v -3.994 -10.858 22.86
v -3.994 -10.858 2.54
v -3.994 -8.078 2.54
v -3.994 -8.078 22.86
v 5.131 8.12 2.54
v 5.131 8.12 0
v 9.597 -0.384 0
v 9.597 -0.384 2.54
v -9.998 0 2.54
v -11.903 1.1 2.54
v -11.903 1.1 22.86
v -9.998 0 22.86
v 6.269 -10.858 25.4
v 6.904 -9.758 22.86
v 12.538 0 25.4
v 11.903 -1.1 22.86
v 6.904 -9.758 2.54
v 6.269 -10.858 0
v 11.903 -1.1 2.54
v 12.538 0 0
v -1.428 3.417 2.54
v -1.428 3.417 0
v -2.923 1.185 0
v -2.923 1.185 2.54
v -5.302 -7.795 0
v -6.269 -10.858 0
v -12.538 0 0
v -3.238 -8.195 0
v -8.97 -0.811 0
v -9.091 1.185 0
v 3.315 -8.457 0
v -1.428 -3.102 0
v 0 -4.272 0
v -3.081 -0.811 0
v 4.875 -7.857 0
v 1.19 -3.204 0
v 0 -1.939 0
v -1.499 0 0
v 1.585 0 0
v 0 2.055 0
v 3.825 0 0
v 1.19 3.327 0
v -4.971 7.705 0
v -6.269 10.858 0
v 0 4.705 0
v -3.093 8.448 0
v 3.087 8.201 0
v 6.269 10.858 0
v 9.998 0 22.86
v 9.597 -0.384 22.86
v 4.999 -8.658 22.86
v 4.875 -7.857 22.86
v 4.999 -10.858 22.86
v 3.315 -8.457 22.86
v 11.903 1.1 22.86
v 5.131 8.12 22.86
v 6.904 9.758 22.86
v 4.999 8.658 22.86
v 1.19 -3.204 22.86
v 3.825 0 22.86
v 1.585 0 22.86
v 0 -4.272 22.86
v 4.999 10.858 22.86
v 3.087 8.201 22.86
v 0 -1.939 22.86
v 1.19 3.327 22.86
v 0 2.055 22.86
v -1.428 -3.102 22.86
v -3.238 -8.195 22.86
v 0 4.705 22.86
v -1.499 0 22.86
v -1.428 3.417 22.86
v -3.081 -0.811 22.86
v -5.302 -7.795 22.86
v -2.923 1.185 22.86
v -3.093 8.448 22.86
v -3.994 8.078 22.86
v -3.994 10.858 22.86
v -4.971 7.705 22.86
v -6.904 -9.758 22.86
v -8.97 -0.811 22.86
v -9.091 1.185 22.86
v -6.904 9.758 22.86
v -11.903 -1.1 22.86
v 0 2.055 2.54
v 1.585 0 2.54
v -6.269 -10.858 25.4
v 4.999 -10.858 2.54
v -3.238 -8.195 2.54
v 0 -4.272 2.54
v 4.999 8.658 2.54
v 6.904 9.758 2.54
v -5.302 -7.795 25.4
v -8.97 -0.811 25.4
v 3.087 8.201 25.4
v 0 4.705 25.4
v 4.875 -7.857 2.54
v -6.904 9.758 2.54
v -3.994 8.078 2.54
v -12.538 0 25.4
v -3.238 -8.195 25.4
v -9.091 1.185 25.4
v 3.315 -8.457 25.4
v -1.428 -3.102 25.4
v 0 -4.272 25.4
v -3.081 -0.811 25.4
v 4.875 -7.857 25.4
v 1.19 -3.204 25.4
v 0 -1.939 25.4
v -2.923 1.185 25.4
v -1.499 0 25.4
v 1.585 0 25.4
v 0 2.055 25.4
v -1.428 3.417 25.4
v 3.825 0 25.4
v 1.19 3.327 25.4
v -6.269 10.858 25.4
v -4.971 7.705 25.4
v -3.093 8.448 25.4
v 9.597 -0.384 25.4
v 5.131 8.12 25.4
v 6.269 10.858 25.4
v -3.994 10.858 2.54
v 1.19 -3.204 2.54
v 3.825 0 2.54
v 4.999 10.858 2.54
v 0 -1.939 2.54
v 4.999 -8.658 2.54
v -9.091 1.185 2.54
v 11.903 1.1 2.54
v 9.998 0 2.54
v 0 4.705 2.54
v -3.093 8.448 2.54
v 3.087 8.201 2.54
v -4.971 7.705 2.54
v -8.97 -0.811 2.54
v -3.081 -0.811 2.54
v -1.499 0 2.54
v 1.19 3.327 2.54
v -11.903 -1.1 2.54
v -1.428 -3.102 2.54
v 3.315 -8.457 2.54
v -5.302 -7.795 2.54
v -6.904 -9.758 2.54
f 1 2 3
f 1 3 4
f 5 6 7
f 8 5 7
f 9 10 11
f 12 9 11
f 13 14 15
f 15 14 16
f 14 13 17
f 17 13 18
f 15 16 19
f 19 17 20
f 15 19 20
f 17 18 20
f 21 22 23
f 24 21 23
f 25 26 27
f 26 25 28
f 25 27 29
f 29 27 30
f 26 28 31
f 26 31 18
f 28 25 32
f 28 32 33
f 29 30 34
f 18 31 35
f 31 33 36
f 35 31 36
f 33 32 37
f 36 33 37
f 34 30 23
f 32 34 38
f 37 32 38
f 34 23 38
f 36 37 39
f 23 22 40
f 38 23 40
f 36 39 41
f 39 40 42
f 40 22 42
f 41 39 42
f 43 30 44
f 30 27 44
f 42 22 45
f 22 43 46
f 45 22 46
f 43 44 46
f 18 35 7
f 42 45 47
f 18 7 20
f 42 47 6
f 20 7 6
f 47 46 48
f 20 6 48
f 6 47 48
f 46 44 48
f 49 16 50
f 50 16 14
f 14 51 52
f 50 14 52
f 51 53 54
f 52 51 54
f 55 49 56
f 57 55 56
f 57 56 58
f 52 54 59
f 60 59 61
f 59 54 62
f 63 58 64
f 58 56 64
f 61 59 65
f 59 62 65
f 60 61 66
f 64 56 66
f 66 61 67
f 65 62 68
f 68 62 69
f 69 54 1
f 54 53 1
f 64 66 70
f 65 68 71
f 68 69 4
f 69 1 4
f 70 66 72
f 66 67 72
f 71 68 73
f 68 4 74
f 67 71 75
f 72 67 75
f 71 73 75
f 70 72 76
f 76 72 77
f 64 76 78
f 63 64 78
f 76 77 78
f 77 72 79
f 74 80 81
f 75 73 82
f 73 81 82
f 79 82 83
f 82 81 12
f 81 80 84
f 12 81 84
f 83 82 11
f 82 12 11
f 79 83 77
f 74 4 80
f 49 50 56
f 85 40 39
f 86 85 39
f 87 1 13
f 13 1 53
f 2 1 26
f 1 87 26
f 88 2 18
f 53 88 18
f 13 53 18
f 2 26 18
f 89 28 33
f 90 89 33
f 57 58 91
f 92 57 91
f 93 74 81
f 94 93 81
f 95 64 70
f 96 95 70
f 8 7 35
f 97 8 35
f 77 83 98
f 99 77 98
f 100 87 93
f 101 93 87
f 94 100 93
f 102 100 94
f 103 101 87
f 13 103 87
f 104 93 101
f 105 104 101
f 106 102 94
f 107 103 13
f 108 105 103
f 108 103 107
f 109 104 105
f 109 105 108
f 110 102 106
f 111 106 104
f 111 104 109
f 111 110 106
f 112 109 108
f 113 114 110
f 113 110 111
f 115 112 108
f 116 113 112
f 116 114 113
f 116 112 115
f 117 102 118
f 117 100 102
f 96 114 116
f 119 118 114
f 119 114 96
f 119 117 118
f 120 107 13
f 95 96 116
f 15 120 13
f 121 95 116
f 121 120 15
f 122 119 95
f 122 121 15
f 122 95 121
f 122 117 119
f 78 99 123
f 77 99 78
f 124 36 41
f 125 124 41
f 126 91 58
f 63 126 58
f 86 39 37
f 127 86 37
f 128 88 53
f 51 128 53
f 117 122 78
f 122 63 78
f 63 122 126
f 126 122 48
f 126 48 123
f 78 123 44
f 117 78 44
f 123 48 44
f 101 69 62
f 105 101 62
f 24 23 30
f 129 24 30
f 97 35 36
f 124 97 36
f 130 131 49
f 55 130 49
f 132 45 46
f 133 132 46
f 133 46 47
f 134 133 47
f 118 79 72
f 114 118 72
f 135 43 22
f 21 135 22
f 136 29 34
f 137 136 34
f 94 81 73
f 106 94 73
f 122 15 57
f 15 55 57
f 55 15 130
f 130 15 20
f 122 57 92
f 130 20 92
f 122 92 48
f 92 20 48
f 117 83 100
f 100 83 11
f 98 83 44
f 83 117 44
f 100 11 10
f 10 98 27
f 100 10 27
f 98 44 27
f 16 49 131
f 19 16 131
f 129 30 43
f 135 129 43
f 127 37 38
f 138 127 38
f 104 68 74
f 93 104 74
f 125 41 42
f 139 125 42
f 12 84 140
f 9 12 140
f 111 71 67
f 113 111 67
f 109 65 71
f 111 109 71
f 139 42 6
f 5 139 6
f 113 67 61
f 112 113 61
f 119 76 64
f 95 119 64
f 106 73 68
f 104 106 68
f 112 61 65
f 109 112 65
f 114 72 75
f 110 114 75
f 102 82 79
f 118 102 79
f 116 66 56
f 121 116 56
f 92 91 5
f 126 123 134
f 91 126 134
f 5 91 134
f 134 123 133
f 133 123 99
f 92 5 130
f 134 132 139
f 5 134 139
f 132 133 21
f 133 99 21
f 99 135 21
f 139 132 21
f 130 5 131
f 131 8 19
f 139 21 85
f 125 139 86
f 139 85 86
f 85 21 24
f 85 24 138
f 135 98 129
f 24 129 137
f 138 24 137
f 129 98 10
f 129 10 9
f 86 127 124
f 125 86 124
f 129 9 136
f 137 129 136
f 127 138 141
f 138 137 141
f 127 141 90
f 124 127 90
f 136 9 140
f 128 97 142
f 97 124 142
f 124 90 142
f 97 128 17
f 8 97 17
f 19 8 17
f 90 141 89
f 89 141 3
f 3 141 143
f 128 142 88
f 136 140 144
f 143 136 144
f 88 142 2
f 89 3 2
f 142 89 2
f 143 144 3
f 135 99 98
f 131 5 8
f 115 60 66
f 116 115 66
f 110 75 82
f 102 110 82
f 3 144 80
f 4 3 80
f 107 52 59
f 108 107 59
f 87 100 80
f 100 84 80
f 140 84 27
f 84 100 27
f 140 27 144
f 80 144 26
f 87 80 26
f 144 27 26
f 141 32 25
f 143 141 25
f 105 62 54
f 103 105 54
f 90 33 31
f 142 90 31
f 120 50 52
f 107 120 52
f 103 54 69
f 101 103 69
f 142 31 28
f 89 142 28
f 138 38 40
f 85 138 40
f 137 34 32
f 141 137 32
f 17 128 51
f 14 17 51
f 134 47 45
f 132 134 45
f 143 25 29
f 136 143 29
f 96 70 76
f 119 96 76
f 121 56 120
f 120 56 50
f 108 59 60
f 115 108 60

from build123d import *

# Parameters (mm, degrees)
F2_DEPTH = 25.4
F3_W     = 8.992830546
F3_H     = 20.32
F4_DEPTH = 21.7172655679
F6_DEPTH = 27.1463319599
F8_DEPTH = 27.1463319599


with BuildPart() as f2:
    # F1 (on face) → F2 (new body)
    with BuildSketch(Plane.XY):
        Polygon((12.5378917714, 0), (6.2689458857, 10.858132784), (-6.2689458857, 10.858132784), (-12.5378917714, 0), (-6.2689458857, -10.858132784), (6.2689458857, -10.858132784), align=None)
        Polygon((-3.0813198537, -0.8107819997), (-1.428119345, -3.1018054447), (-5.3015932459, -7.7946673792), (-8.9699157746, -0.8107819997), align=None, mode=Mode.SUBTRACT)
        Polygon((3.3147766868, -8.4572770768), (-3.2382511436, -8.1953331628), (0, -4.2720679194), align=None, mode=Mode.SUBTRACT)
        Polygon((-9.0911711595, 1.1845681444), (-4.9708869394, 7.7049685974), (-1.428119345, 3.4170282109), (-2.9231349472, 1.1845681444), align=None, mode=Mode.SUBTRACT)
        Polygon((0, 4.7049229033), (-3.0929306056, 8.4484092324), (3.0869638225, 8.2013805647), align=None, mode=Mode.SUBTRACT)
        Polygon((-1.4994712546, 0), (0, 2.0553264767), (1.5851336066, 0), (0, -1.9388410728), align=None, mode=Mode.SUBTRACT)
        Polygon((1.1896715732, 3.32692286), (5.1308790649, 8.1196792242), (9.5972880112, -0.3836320019), (4.8747631368, -7.8570856971), (1.1896715732, -3.2043200918), (3.8246668436, 0), align=None, mode=Mode.SUBTRACT)
    extrude(amount=F2_DEPTH)

    # F3 (on face) → F4 (cut, through all)
    with BuildSketch(Plane.XZ.offset(10.858132784)):
        with Locations((0.5025306127, 12.7)):
            Rectangle(F3_W, F3_H)
    extrude(amount=-F4_DEPTH, mode=Mode.SUBTRACT)

    # F5 (on face) → F6 (cut, through all)
    with BuildSketch(Plane(origin=(-9.4034188286, -5.429066392, 0), x_dir=(0.5, -0.8660254038, 0), z_dir=(-0.8660254038, -0.5, 0))):
        Polygon((-4.9989458857, 22.86), (-4.9989458857, 2.54), (4.9989458857, 2.54), (4.9989458857, 22.86), (0, 22.86), align=None)
    extrude(amount=-F6_DEPTH, mode=Mode.SUBTRACT)

    # F7 (on face) → F8 (cut, through all)
    with BuildSketch(Plane(origin=(-9.4034188286, 5.429066392, 0), x_dir=(-0.5, -0.8660254038, 0), z_dir=(-0.8660254038, 0.5, 0))):
        Polygon((-4.9989458857, 22.86), (-4.9989458857, 12.7), (-4.9989458857, 2.54), (4.9989458857, 2.54), (4.9989458857, 12.7), (4.9989458857, 22.86), (0, 22.86), align=None)
    extrude(amount=-F8_DEPTH, mode=Mode.SUBTRACT)


solid = f2.part
